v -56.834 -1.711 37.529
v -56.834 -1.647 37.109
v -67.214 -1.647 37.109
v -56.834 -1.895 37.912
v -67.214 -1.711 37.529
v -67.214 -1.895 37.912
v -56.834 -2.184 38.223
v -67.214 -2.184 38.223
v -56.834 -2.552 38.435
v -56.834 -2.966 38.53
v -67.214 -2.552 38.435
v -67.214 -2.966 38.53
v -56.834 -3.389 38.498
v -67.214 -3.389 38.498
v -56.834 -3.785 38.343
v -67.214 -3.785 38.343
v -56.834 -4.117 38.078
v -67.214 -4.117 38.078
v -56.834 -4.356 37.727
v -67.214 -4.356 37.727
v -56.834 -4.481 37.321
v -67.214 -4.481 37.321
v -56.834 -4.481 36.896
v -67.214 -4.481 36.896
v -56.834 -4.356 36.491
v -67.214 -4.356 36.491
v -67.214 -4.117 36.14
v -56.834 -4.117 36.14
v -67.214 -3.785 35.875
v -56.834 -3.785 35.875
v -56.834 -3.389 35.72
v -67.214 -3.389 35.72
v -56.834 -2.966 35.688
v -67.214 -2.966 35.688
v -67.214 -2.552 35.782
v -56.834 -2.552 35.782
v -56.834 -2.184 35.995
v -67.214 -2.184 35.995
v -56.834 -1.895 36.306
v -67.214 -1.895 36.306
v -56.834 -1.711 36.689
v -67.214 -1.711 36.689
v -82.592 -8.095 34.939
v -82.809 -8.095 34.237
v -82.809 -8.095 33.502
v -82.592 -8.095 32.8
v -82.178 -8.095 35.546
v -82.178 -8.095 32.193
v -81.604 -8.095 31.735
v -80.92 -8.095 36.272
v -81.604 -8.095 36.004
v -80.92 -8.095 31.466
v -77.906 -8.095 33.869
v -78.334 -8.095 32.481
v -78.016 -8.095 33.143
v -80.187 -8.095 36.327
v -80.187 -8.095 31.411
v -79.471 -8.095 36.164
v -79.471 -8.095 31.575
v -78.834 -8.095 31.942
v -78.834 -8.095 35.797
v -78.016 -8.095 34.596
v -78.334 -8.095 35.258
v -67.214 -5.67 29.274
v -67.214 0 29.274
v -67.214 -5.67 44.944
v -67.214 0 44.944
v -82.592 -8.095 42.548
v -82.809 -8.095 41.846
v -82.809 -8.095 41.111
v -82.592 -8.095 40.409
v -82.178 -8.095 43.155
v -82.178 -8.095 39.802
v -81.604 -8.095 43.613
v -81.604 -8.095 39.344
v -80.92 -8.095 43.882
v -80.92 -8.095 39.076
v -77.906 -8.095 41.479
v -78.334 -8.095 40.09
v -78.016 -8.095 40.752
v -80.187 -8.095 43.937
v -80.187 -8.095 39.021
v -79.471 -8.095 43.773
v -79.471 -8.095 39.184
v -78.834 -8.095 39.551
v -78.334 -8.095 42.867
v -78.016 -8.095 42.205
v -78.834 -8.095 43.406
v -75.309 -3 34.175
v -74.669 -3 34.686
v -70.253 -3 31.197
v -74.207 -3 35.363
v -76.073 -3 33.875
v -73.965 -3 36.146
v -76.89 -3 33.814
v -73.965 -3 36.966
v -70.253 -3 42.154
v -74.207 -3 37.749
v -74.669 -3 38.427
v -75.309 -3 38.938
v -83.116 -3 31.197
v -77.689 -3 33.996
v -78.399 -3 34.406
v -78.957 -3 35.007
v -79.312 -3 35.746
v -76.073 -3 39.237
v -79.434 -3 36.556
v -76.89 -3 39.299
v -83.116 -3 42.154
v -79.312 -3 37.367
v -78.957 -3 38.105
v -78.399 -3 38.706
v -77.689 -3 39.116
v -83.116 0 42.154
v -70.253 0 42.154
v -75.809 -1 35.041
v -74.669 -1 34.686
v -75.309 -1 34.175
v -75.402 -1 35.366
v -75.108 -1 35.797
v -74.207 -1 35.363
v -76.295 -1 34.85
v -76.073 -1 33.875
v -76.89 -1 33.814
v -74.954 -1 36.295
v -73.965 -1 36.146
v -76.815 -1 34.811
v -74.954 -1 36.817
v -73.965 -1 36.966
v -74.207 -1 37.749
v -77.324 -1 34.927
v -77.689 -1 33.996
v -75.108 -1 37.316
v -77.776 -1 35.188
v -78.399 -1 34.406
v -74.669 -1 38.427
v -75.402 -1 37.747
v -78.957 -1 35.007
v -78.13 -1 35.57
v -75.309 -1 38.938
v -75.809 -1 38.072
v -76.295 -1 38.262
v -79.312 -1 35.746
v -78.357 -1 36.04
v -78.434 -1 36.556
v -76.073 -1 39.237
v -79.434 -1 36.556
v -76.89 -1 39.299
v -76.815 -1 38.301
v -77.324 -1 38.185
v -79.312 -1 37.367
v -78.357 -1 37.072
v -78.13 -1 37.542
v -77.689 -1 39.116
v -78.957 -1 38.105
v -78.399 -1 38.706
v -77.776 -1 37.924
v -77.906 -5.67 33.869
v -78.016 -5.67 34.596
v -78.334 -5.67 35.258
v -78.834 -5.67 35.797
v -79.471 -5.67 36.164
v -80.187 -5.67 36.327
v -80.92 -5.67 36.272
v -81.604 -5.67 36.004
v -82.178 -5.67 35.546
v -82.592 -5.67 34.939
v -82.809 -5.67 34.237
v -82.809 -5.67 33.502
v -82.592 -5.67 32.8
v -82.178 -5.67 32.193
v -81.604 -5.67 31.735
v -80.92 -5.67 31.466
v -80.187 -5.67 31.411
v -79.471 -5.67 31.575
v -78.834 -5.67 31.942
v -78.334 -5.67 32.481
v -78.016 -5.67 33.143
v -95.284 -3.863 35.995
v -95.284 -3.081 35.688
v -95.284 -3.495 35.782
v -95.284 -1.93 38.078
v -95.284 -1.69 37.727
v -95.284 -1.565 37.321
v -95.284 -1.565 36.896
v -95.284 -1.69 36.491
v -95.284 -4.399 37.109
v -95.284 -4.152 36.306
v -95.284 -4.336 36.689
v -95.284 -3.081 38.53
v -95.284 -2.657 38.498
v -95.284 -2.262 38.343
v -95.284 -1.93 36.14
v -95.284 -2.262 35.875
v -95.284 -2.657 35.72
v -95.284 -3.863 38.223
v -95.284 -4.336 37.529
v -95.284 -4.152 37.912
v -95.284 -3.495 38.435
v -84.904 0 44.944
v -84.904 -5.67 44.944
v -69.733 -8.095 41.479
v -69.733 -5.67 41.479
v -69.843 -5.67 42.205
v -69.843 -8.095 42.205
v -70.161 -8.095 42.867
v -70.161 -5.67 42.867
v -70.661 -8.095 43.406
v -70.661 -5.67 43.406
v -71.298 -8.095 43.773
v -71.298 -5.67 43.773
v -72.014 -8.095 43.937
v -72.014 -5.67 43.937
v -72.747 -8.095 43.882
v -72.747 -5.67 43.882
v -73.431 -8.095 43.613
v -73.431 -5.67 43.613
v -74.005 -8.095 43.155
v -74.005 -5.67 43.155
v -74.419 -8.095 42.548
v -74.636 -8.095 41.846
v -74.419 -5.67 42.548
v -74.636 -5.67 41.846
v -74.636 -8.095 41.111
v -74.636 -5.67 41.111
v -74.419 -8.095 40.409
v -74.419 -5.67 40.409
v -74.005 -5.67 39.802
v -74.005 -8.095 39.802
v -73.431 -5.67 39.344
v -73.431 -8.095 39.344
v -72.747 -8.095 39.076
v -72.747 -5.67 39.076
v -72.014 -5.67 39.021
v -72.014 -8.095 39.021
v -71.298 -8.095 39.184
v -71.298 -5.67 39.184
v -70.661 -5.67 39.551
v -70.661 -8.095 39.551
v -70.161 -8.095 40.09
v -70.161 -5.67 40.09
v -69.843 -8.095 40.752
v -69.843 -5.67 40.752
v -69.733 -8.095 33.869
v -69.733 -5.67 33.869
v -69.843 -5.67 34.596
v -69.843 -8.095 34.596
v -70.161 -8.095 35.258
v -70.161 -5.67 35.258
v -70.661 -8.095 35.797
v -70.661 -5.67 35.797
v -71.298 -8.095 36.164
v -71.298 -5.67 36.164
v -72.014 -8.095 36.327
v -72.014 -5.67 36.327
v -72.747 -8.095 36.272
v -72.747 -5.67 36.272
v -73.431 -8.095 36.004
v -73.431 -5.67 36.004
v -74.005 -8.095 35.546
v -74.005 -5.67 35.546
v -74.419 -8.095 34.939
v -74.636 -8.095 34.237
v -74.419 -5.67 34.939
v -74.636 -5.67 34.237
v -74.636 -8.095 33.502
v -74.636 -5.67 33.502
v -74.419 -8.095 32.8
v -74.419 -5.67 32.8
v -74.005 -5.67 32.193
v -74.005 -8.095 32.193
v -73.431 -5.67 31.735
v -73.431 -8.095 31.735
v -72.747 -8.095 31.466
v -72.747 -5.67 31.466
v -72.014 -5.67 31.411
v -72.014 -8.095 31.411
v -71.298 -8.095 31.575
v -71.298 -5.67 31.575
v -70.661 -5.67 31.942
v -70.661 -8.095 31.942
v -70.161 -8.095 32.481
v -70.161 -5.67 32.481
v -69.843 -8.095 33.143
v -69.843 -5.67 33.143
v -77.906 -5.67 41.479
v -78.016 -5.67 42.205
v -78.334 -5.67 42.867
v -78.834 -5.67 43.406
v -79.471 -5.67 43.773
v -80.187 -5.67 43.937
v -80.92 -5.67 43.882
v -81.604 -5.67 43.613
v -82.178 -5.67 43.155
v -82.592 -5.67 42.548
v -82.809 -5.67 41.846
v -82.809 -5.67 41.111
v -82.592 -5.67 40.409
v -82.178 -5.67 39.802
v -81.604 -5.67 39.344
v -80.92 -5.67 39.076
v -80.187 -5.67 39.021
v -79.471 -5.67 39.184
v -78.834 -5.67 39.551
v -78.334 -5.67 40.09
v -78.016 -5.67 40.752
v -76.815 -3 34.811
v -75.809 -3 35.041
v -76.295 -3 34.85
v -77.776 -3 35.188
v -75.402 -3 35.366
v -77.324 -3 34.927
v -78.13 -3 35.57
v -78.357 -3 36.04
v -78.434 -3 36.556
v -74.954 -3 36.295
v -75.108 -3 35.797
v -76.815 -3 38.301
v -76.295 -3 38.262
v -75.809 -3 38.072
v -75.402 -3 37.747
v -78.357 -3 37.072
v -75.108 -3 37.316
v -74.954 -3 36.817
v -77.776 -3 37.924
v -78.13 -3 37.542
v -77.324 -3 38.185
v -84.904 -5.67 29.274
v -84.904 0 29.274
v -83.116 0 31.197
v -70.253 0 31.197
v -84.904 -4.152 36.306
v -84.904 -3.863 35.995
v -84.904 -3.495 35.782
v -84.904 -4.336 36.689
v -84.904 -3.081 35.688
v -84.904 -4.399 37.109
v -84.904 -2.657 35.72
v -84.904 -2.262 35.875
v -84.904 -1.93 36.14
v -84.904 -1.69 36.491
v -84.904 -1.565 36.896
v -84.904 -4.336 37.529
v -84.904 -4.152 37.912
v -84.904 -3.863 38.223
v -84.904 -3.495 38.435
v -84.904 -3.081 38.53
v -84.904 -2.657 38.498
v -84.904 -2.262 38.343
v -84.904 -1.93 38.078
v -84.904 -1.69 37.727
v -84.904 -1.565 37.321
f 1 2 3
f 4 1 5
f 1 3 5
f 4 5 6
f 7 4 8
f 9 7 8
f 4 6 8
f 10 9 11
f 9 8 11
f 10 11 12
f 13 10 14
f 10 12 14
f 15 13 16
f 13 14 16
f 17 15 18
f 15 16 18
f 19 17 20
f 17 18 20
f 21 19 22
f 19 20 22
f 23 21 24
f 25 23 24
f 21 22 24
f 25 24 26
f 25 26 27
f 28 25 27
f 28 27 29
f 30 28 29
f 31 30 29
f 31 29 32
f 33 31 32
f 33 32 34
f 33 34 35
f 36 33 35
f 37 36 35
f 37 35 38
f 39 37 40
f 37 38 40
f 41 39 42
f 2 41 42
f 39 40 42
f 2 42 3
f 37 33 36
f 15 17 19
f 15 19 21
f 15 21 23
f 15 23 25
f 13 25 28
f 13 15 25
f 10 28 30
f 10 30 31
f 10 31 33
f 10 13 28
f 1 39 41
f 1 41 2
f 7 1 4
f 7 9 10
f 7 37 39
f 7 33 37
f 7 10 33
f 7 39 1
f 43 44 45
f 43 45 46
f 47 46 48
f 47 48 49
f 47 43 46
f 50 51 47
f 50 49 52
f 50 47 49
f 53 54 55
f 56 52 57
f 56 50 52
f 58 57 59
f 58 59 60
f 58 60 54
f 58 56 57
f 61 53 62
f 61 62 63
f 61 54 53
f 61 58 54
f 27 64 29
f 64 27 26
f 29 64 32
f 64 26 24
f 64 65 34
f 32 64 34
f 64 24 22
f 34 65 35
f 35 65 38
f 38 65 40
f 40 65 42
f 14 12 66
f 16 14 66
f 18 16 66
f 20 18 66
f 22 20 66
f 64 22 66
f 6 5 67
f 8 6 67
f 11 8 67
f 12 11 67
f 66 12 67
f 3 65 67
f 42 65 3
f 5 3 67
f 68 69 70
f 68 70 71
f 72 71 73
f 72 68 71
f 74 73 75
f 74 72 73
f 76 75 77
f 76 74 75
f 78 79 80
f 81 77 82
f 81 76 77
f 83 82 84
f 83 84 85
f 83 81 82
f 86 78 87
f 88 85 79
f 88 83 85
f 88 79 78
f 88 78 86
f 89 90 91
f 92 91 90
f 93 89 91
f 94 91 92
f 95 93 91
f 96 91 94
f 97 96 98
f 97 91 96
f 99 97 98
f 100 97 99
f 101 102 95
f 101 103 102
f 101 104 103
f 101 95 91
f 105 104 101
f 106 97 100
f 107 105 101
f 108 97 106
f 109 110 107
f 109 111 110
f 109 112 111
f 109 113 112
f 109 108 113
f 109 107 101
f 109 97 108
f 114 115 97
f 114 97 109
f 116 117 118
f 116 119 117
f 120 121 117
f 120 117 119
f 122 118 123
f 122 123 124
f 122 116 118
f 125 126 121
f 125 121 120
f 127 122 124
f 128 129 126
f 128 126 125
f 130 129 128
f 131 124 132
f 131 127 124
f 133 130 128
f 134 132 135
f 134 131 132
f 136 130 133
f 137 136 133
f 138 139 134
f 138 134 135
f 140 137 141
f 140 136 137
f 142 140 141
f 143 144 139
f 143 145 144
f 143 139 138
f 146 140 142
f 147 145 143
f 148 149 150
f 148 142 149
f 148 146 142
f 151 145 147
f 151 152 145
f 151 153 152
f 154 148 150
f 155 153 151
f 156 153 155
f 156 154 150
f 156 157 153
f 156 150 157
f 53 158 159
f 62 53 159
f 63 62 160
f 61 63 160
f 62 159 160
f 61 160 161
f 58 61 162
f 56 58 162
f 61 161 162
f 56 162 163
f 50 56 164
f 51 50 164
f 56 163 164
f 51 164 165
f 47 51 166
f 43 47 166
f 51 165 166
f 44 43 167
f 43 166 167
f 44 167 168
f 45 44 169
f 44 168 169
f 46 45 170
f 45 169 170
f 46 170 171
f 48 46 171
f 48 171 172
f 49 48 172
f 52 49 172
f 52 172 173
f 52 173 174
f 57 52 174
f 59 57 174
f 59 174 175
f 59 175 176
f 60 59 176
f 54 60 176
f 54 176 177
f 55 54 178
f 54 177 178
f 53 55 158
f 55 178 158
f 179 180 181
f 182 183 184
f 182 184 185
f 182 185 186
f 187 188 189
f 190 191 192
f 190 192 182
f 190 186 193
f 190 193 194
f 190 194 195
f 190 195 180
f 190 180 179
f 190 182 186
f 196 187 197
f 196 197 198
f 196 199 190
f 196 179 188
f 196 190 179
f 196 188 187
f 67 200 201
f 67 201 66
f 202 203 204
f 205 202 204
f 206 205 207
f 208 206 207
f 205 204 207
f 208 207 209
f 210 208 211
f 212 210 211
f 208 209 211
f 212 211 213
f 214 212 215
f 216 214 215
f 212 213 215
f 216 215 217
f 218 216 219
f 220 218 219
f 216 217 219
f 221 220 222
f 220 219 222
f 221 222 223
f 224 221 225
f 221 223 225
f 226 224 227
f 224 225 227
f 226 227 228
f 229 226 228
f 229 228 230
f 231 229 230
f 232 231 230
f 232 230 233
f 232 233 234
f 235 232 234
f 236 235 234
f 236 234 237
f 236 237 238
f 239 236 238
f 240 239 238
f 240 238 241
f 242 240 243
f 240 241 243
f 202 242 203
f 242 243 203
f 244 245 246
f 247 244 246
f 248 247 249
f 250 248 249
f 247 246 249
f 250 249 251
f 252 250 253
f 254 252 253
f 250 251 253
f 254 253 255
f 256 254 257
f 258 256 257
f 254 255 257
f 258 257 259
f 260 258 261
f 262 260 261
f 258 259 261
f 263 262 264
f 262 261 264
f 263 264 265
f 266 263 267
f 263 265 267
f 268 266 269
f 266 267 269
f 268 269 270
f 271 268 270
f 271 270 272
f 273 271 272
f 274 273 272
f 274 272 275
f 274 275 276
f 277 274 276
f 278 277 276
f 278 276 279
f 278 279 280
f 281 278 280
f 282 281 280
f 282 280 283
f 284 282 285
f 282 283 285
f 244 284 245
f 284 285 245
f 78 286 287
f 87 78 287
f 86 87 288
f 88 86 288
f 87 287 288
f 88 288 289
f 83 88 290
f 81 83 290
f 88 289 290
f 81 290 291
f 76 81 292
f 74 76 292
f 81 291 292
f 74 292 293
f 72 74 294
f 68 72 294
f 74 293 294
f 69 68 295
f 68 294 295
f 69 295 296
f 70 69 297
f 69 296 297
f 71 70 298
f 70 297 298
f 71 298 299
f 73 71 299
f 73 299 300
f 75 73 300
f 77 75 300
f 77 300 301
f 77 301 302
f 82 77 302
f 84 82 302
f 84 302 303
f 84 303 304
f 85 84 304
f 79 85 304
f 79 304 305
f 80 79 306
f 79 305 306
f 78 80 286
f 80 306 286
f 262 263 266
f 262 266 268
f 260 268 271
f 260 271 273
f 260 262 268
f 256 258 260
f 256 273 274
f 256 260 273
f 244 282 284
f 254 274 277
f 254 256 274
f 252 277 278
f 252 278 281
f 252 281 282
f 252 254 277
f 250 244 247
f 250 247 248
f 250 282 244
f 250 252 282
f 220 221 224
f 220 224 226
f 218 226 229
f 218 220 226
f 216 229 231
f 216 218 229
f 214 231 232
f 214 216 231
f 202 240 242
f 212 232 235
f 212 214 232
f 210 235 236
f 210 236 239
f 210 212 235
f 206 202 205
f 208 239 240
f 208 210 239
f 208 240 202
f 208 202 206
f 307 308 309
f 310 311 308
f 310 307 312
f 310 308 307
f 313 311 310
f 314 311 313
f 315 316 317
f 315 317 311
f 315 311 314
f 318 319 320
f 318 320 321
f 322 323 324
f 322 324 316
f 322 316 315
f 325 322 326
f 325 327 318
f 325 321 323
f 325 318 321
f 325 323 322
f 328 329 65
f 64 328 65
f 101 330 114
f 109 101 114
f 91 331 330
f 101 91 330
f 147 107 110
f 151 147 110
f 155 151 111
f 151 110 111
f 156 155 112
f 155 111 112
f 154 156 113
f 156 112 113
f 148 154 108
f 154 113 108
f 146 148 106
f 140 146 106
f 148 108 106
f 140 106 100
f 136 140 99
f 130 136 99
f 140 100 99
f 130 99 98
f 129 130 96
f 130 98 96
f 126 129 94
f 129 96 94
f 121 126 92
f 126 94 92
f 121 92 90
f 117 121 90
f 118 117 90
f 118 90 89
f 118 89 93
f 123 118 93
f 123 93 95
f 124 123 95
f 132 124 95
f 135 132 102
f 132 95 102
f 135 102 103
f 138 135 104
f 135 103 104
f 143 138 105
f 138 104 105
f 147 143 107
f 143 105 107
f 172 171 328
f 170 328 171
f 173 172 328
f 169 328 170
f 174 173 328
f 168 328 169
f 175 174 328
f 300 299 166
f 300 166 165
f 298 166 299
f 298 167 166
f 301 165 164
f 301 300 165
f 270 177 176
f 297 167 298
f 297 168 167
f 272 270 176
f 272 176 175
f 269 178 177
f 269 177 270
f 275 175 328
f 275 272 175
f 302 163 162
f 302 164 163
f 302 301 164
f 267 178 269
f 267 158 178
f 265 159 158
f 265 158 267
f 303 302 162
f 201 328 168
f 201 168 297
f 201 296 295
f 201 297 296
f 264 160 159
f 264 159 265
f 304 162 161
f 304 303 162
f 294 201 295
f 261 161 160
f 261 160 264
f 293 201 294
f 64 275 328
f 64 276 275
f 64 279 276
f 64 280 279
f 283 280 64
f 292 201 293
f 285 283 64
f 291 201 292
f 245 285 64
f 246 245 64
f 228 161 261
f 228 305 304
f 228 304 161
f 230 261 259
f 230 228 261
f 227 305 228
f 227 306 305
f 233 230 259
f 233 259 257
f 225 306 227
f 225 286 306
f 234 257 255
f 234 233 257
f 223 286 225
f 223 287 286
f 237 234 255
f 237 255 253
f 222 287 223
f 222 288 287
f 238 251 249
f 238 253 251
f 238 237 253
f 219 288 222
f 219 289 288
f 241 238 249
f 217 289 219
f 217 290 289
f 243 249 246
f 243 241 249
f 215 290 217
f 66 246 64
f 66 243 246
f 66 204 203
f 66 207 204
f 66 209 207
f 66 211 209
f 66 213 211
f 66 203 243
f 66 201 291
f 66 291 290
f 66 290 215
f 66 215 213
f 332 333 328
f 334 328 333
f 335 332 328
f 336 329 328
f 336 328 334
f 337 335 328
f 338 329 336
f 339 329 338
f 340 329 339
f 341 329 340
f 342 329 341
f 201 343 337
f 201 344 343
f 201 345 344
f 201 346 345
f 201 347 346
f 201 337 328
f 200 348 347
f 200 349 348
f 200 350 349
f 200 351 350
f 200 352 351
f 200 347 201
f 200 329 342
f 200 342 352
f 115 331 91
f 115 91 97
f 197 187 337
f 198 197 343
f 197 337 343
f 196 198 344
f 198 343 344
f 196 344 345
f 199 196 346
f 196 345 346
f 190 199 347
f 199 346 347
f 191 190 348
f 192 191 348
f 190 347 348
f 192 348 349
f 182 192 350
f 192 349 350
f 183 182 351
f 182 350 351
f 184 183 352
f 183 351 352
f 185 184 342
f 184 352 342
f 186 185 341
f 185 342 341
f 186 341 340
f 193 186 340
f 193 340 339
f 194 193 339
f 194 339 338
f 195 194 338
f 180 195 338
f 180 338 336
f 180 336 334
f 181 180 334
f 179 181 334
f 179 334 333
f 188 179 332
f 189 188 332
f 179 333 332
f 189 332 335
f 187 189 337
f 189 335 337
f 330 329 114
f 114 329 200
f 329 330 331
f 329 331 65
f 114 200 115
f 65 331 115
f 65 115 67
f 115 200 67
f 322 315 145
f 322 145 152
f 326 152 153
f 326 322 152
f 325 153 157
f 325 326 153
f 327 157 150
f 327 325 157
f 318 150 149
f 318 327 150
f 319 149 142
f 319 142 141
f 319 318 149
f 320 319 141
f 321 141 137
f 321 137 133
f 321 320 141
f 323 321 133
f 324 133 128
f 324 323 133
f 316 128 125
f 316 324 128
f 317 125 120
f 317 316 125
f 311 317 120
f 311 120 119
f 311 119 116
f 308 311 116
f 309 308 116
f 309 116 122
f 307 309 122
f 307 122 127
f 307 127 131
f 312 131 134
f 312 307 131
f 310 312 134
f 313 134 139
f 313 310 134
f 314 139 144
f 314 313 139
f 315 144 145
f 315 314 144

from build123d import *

# Parameters (mm, degrees)
F0_R      = 7.8435703096
F1_DEPTH  = 5.67
F0_R_2    = 7.7757185056
F2_W      = 17.6903378959
F2_H      = 15.67
F3_DEPTH  = 5.67
F4_R      = 1.425
F5_DEPTH  = 10.38
F6_R      = 1.425
F7_DEPTH  = 10.38
F8_R      = 2.465
F9_DEPTH  = 2.425
F10_W     = 12.8629952669
F10_H     = 10.9573621303
F11_DEPTH = 3
F12_R     = 2.75
F12_R_2   = 1.75
F13_DEPTH = 2
F14_R     = 4.345
F14_R_2   = 3.4662678384
F15_DEPTH = 25
F14_R_3   = 3.1273613379
F14_R_4   = 4.1038801884
F14_R_5   = 4.2870364602
F16_DEPTH = 25


with BuildPart() as f1:
    # F0 (on Front) → F1 (new body)
    with BuildSketch(Plane.XZ):
        with Locations((-31.0182443455, 13.5022135742)):
            Circle(F0_R)
    extrude(amount=F1_DEPTH)

    # F14 (on Front) → F15, piece 2 (join)
    with BuildSketch(Plane.XZ):
        with Locations((-31.2459040433, 14.0220327303)):
            Circle(F14_R)
        with Locations((-31.2459040433, 14.0220327303)):
            Circle(F14_R_3, mode=Mode.SUBTRACT)
    extrude(amount=F15_DEPTH)

    # F14 (on Front) → F16 (cut)
    with BuildSketch(Plane.XZ):
        with Locations((27.6749636978, 13.738758862)):
            Circle(F14_R)
        with Locations((27.6749636978, 13.738758862)):
            Circle(F14_R_2, mode=Mode.SUBTRACT)
        with Locations((-30.9626311064, -35.5508103967)):
            Circle(F14_R)
        with Locations((-30.9626311064, -35.5508103967)):
            Circle(F14_R_4, mode=Mode.SUBTRACT)
        with Locations((27.9582366347, -35.5508103967)):
            Circle(F14_R)
        with Locations((27.9582366347, -35.5508103967)):
            Circle(F14_R_5, mode=Mode.SUBTRACT)
        with Locations((-31.2459040433, 14.0220327303)):
            Circle(F14_R)
        with Locations((-31.2459040433, 14.0220327303)):
            Circle(F14_R_3, mode=Mode.SUBTRACT)
    extrude(amount=-F16_DEPTH, mode=Mode.SUBTRACT)


with BuildPart() as f1b:
    # F0 (on Front) → F1, piece 2 (new body)
    with BuildSketch(Plane.XZ):
        with Locations((27.6562659057, 13.5022135742)):
            Circle(F0_R_2)
    extrude(amount=F1_DEPTH)

    # F14 (on Front) → F15 (join)
    with BuildSketch(Plane.XZ):
        with Locations((27.6749636978, 13.738758862)):
            Circle(F14_R)
        with Locations((27.6749636978, 13.738758862)):
            Circle(F14_R_2, mode=Mode.SUBTRACT)
    extrude(amount=F15_DEPTH)


with BuildPart() as f1c:
    # F0 (on Front) → F1, piece 3 (new body)
    with BuildSketch(Plane.XZ):
        with Locations((-31.0182443455, -35.7866174178)):
            Circle(F0_R_2)
    extrude(amount=F1_DEPTH)

    # F14 (on Front) → F15, piece 3 (join)
    with BuildSketch(Plane.XZ):
        with Locations((-30.9626311064, -35.5508103967)):
            Circle(F14_R)
        with Locations((-30.9626311064, -35.5508103967)):
            Circle(F14_R_4, mode=Mode.SUBTRACT)
    extrude(amount=F15_DEPTH)


with BuildPart() as f1d:
    # F0 (on Front) → F1, piece 4 (new body)
    with BuildSketch(Plane.XZ):
        with Locations((27.6562659057, -35.7866174178)):
            Circle(F0_R_2)
    extrude(amount=F1_DEPTH)

    # F14 (on Front) → F15, piece 4 (join)
    with BuildSketch(Plane.XZ):
        with Locations((27.9582366347, -35.5508103967)):
            Circle(F14_R)
        with Locations((27.9582366347, -35.5508103967)):
            Circle(F14_R_5, mode=Mode.SUBTRACT)
    extrude(amount=F15_DEPTH)


with BuildPart() as f3:
    # F2 (on Front) → F3 (new body)
    with BuildSketch(Plane.XZ):
        with Locations((-76.0589055717, 37.1088152751)):
            Rectangle(F2_W, F2_H)
    extrude(amount=F3_DEPTH)

    # F4 (on face) → F5 (join)
    with BuildSketch(Plane(origin=(-84.9040745196, 0, 0), x_dir=(0, -1, 0), z_dir=(-1, 0, 0))):
        with Locations((2.974371193, 37.1088152751)):
            Circle(F4_R)
    extrude(amount=F5_DEPTH)

    # F6 (on face) → F7 (join)
    with BuildSketch(Plane.YZ.offset(-67.2137366238)):
        with Locations((-3.0722431839, 37.1088152751)):
            Circle(F6_R)
    extrude(amount=F7_DEPTH)

    # F8 (on face) → F9 (join)
    with BuildSketch(Plane.XZ.offset(5.67)):
        with Locations((-80.3711495243, 41.4787063429)):
            Circle(F8_R)
        with Locations((-72.1980867, 41.4787063429)):
            Circle(F8_R)
        with Locations((-72.1980867, 33.8693021292)):
            Circle(F8_R)
        with Locations((-80.3711495243, 33.8693021292)):
            Circle(F8_R)
    extrude(amount=F9_DEPTH)

    # F10 (on face) → F11 (cut)
    with BuildSketch(Plane(origin=(0, 0, 0), x_dir=(-1, 0, 0), z_dir=(0, 1, 0))):
        with Locations((76.6844823956, 36.675314419)):
            Rectangle(F10_W, F10_H)
    extrude(amount=-F11_DEPTH, mode=Mode.SUBTRACT)

    # F12 (on face) → F13 (join)
    with BuildSketch(Plane(origin=(0, -3, 0), x_dir=(-1, 0, 0), z_dir=(0, 1, 0))):
        with Locations((76.6844823956, 36.5562103689)):
            Circle(F12_R)
        with Locations((76.6844823956, 36.5562103689)):
            Circle(F12_R_2, mode=Mode.SUBTRACT)
    extrude(amount=F13_DEPTH)


solid = f3.part
